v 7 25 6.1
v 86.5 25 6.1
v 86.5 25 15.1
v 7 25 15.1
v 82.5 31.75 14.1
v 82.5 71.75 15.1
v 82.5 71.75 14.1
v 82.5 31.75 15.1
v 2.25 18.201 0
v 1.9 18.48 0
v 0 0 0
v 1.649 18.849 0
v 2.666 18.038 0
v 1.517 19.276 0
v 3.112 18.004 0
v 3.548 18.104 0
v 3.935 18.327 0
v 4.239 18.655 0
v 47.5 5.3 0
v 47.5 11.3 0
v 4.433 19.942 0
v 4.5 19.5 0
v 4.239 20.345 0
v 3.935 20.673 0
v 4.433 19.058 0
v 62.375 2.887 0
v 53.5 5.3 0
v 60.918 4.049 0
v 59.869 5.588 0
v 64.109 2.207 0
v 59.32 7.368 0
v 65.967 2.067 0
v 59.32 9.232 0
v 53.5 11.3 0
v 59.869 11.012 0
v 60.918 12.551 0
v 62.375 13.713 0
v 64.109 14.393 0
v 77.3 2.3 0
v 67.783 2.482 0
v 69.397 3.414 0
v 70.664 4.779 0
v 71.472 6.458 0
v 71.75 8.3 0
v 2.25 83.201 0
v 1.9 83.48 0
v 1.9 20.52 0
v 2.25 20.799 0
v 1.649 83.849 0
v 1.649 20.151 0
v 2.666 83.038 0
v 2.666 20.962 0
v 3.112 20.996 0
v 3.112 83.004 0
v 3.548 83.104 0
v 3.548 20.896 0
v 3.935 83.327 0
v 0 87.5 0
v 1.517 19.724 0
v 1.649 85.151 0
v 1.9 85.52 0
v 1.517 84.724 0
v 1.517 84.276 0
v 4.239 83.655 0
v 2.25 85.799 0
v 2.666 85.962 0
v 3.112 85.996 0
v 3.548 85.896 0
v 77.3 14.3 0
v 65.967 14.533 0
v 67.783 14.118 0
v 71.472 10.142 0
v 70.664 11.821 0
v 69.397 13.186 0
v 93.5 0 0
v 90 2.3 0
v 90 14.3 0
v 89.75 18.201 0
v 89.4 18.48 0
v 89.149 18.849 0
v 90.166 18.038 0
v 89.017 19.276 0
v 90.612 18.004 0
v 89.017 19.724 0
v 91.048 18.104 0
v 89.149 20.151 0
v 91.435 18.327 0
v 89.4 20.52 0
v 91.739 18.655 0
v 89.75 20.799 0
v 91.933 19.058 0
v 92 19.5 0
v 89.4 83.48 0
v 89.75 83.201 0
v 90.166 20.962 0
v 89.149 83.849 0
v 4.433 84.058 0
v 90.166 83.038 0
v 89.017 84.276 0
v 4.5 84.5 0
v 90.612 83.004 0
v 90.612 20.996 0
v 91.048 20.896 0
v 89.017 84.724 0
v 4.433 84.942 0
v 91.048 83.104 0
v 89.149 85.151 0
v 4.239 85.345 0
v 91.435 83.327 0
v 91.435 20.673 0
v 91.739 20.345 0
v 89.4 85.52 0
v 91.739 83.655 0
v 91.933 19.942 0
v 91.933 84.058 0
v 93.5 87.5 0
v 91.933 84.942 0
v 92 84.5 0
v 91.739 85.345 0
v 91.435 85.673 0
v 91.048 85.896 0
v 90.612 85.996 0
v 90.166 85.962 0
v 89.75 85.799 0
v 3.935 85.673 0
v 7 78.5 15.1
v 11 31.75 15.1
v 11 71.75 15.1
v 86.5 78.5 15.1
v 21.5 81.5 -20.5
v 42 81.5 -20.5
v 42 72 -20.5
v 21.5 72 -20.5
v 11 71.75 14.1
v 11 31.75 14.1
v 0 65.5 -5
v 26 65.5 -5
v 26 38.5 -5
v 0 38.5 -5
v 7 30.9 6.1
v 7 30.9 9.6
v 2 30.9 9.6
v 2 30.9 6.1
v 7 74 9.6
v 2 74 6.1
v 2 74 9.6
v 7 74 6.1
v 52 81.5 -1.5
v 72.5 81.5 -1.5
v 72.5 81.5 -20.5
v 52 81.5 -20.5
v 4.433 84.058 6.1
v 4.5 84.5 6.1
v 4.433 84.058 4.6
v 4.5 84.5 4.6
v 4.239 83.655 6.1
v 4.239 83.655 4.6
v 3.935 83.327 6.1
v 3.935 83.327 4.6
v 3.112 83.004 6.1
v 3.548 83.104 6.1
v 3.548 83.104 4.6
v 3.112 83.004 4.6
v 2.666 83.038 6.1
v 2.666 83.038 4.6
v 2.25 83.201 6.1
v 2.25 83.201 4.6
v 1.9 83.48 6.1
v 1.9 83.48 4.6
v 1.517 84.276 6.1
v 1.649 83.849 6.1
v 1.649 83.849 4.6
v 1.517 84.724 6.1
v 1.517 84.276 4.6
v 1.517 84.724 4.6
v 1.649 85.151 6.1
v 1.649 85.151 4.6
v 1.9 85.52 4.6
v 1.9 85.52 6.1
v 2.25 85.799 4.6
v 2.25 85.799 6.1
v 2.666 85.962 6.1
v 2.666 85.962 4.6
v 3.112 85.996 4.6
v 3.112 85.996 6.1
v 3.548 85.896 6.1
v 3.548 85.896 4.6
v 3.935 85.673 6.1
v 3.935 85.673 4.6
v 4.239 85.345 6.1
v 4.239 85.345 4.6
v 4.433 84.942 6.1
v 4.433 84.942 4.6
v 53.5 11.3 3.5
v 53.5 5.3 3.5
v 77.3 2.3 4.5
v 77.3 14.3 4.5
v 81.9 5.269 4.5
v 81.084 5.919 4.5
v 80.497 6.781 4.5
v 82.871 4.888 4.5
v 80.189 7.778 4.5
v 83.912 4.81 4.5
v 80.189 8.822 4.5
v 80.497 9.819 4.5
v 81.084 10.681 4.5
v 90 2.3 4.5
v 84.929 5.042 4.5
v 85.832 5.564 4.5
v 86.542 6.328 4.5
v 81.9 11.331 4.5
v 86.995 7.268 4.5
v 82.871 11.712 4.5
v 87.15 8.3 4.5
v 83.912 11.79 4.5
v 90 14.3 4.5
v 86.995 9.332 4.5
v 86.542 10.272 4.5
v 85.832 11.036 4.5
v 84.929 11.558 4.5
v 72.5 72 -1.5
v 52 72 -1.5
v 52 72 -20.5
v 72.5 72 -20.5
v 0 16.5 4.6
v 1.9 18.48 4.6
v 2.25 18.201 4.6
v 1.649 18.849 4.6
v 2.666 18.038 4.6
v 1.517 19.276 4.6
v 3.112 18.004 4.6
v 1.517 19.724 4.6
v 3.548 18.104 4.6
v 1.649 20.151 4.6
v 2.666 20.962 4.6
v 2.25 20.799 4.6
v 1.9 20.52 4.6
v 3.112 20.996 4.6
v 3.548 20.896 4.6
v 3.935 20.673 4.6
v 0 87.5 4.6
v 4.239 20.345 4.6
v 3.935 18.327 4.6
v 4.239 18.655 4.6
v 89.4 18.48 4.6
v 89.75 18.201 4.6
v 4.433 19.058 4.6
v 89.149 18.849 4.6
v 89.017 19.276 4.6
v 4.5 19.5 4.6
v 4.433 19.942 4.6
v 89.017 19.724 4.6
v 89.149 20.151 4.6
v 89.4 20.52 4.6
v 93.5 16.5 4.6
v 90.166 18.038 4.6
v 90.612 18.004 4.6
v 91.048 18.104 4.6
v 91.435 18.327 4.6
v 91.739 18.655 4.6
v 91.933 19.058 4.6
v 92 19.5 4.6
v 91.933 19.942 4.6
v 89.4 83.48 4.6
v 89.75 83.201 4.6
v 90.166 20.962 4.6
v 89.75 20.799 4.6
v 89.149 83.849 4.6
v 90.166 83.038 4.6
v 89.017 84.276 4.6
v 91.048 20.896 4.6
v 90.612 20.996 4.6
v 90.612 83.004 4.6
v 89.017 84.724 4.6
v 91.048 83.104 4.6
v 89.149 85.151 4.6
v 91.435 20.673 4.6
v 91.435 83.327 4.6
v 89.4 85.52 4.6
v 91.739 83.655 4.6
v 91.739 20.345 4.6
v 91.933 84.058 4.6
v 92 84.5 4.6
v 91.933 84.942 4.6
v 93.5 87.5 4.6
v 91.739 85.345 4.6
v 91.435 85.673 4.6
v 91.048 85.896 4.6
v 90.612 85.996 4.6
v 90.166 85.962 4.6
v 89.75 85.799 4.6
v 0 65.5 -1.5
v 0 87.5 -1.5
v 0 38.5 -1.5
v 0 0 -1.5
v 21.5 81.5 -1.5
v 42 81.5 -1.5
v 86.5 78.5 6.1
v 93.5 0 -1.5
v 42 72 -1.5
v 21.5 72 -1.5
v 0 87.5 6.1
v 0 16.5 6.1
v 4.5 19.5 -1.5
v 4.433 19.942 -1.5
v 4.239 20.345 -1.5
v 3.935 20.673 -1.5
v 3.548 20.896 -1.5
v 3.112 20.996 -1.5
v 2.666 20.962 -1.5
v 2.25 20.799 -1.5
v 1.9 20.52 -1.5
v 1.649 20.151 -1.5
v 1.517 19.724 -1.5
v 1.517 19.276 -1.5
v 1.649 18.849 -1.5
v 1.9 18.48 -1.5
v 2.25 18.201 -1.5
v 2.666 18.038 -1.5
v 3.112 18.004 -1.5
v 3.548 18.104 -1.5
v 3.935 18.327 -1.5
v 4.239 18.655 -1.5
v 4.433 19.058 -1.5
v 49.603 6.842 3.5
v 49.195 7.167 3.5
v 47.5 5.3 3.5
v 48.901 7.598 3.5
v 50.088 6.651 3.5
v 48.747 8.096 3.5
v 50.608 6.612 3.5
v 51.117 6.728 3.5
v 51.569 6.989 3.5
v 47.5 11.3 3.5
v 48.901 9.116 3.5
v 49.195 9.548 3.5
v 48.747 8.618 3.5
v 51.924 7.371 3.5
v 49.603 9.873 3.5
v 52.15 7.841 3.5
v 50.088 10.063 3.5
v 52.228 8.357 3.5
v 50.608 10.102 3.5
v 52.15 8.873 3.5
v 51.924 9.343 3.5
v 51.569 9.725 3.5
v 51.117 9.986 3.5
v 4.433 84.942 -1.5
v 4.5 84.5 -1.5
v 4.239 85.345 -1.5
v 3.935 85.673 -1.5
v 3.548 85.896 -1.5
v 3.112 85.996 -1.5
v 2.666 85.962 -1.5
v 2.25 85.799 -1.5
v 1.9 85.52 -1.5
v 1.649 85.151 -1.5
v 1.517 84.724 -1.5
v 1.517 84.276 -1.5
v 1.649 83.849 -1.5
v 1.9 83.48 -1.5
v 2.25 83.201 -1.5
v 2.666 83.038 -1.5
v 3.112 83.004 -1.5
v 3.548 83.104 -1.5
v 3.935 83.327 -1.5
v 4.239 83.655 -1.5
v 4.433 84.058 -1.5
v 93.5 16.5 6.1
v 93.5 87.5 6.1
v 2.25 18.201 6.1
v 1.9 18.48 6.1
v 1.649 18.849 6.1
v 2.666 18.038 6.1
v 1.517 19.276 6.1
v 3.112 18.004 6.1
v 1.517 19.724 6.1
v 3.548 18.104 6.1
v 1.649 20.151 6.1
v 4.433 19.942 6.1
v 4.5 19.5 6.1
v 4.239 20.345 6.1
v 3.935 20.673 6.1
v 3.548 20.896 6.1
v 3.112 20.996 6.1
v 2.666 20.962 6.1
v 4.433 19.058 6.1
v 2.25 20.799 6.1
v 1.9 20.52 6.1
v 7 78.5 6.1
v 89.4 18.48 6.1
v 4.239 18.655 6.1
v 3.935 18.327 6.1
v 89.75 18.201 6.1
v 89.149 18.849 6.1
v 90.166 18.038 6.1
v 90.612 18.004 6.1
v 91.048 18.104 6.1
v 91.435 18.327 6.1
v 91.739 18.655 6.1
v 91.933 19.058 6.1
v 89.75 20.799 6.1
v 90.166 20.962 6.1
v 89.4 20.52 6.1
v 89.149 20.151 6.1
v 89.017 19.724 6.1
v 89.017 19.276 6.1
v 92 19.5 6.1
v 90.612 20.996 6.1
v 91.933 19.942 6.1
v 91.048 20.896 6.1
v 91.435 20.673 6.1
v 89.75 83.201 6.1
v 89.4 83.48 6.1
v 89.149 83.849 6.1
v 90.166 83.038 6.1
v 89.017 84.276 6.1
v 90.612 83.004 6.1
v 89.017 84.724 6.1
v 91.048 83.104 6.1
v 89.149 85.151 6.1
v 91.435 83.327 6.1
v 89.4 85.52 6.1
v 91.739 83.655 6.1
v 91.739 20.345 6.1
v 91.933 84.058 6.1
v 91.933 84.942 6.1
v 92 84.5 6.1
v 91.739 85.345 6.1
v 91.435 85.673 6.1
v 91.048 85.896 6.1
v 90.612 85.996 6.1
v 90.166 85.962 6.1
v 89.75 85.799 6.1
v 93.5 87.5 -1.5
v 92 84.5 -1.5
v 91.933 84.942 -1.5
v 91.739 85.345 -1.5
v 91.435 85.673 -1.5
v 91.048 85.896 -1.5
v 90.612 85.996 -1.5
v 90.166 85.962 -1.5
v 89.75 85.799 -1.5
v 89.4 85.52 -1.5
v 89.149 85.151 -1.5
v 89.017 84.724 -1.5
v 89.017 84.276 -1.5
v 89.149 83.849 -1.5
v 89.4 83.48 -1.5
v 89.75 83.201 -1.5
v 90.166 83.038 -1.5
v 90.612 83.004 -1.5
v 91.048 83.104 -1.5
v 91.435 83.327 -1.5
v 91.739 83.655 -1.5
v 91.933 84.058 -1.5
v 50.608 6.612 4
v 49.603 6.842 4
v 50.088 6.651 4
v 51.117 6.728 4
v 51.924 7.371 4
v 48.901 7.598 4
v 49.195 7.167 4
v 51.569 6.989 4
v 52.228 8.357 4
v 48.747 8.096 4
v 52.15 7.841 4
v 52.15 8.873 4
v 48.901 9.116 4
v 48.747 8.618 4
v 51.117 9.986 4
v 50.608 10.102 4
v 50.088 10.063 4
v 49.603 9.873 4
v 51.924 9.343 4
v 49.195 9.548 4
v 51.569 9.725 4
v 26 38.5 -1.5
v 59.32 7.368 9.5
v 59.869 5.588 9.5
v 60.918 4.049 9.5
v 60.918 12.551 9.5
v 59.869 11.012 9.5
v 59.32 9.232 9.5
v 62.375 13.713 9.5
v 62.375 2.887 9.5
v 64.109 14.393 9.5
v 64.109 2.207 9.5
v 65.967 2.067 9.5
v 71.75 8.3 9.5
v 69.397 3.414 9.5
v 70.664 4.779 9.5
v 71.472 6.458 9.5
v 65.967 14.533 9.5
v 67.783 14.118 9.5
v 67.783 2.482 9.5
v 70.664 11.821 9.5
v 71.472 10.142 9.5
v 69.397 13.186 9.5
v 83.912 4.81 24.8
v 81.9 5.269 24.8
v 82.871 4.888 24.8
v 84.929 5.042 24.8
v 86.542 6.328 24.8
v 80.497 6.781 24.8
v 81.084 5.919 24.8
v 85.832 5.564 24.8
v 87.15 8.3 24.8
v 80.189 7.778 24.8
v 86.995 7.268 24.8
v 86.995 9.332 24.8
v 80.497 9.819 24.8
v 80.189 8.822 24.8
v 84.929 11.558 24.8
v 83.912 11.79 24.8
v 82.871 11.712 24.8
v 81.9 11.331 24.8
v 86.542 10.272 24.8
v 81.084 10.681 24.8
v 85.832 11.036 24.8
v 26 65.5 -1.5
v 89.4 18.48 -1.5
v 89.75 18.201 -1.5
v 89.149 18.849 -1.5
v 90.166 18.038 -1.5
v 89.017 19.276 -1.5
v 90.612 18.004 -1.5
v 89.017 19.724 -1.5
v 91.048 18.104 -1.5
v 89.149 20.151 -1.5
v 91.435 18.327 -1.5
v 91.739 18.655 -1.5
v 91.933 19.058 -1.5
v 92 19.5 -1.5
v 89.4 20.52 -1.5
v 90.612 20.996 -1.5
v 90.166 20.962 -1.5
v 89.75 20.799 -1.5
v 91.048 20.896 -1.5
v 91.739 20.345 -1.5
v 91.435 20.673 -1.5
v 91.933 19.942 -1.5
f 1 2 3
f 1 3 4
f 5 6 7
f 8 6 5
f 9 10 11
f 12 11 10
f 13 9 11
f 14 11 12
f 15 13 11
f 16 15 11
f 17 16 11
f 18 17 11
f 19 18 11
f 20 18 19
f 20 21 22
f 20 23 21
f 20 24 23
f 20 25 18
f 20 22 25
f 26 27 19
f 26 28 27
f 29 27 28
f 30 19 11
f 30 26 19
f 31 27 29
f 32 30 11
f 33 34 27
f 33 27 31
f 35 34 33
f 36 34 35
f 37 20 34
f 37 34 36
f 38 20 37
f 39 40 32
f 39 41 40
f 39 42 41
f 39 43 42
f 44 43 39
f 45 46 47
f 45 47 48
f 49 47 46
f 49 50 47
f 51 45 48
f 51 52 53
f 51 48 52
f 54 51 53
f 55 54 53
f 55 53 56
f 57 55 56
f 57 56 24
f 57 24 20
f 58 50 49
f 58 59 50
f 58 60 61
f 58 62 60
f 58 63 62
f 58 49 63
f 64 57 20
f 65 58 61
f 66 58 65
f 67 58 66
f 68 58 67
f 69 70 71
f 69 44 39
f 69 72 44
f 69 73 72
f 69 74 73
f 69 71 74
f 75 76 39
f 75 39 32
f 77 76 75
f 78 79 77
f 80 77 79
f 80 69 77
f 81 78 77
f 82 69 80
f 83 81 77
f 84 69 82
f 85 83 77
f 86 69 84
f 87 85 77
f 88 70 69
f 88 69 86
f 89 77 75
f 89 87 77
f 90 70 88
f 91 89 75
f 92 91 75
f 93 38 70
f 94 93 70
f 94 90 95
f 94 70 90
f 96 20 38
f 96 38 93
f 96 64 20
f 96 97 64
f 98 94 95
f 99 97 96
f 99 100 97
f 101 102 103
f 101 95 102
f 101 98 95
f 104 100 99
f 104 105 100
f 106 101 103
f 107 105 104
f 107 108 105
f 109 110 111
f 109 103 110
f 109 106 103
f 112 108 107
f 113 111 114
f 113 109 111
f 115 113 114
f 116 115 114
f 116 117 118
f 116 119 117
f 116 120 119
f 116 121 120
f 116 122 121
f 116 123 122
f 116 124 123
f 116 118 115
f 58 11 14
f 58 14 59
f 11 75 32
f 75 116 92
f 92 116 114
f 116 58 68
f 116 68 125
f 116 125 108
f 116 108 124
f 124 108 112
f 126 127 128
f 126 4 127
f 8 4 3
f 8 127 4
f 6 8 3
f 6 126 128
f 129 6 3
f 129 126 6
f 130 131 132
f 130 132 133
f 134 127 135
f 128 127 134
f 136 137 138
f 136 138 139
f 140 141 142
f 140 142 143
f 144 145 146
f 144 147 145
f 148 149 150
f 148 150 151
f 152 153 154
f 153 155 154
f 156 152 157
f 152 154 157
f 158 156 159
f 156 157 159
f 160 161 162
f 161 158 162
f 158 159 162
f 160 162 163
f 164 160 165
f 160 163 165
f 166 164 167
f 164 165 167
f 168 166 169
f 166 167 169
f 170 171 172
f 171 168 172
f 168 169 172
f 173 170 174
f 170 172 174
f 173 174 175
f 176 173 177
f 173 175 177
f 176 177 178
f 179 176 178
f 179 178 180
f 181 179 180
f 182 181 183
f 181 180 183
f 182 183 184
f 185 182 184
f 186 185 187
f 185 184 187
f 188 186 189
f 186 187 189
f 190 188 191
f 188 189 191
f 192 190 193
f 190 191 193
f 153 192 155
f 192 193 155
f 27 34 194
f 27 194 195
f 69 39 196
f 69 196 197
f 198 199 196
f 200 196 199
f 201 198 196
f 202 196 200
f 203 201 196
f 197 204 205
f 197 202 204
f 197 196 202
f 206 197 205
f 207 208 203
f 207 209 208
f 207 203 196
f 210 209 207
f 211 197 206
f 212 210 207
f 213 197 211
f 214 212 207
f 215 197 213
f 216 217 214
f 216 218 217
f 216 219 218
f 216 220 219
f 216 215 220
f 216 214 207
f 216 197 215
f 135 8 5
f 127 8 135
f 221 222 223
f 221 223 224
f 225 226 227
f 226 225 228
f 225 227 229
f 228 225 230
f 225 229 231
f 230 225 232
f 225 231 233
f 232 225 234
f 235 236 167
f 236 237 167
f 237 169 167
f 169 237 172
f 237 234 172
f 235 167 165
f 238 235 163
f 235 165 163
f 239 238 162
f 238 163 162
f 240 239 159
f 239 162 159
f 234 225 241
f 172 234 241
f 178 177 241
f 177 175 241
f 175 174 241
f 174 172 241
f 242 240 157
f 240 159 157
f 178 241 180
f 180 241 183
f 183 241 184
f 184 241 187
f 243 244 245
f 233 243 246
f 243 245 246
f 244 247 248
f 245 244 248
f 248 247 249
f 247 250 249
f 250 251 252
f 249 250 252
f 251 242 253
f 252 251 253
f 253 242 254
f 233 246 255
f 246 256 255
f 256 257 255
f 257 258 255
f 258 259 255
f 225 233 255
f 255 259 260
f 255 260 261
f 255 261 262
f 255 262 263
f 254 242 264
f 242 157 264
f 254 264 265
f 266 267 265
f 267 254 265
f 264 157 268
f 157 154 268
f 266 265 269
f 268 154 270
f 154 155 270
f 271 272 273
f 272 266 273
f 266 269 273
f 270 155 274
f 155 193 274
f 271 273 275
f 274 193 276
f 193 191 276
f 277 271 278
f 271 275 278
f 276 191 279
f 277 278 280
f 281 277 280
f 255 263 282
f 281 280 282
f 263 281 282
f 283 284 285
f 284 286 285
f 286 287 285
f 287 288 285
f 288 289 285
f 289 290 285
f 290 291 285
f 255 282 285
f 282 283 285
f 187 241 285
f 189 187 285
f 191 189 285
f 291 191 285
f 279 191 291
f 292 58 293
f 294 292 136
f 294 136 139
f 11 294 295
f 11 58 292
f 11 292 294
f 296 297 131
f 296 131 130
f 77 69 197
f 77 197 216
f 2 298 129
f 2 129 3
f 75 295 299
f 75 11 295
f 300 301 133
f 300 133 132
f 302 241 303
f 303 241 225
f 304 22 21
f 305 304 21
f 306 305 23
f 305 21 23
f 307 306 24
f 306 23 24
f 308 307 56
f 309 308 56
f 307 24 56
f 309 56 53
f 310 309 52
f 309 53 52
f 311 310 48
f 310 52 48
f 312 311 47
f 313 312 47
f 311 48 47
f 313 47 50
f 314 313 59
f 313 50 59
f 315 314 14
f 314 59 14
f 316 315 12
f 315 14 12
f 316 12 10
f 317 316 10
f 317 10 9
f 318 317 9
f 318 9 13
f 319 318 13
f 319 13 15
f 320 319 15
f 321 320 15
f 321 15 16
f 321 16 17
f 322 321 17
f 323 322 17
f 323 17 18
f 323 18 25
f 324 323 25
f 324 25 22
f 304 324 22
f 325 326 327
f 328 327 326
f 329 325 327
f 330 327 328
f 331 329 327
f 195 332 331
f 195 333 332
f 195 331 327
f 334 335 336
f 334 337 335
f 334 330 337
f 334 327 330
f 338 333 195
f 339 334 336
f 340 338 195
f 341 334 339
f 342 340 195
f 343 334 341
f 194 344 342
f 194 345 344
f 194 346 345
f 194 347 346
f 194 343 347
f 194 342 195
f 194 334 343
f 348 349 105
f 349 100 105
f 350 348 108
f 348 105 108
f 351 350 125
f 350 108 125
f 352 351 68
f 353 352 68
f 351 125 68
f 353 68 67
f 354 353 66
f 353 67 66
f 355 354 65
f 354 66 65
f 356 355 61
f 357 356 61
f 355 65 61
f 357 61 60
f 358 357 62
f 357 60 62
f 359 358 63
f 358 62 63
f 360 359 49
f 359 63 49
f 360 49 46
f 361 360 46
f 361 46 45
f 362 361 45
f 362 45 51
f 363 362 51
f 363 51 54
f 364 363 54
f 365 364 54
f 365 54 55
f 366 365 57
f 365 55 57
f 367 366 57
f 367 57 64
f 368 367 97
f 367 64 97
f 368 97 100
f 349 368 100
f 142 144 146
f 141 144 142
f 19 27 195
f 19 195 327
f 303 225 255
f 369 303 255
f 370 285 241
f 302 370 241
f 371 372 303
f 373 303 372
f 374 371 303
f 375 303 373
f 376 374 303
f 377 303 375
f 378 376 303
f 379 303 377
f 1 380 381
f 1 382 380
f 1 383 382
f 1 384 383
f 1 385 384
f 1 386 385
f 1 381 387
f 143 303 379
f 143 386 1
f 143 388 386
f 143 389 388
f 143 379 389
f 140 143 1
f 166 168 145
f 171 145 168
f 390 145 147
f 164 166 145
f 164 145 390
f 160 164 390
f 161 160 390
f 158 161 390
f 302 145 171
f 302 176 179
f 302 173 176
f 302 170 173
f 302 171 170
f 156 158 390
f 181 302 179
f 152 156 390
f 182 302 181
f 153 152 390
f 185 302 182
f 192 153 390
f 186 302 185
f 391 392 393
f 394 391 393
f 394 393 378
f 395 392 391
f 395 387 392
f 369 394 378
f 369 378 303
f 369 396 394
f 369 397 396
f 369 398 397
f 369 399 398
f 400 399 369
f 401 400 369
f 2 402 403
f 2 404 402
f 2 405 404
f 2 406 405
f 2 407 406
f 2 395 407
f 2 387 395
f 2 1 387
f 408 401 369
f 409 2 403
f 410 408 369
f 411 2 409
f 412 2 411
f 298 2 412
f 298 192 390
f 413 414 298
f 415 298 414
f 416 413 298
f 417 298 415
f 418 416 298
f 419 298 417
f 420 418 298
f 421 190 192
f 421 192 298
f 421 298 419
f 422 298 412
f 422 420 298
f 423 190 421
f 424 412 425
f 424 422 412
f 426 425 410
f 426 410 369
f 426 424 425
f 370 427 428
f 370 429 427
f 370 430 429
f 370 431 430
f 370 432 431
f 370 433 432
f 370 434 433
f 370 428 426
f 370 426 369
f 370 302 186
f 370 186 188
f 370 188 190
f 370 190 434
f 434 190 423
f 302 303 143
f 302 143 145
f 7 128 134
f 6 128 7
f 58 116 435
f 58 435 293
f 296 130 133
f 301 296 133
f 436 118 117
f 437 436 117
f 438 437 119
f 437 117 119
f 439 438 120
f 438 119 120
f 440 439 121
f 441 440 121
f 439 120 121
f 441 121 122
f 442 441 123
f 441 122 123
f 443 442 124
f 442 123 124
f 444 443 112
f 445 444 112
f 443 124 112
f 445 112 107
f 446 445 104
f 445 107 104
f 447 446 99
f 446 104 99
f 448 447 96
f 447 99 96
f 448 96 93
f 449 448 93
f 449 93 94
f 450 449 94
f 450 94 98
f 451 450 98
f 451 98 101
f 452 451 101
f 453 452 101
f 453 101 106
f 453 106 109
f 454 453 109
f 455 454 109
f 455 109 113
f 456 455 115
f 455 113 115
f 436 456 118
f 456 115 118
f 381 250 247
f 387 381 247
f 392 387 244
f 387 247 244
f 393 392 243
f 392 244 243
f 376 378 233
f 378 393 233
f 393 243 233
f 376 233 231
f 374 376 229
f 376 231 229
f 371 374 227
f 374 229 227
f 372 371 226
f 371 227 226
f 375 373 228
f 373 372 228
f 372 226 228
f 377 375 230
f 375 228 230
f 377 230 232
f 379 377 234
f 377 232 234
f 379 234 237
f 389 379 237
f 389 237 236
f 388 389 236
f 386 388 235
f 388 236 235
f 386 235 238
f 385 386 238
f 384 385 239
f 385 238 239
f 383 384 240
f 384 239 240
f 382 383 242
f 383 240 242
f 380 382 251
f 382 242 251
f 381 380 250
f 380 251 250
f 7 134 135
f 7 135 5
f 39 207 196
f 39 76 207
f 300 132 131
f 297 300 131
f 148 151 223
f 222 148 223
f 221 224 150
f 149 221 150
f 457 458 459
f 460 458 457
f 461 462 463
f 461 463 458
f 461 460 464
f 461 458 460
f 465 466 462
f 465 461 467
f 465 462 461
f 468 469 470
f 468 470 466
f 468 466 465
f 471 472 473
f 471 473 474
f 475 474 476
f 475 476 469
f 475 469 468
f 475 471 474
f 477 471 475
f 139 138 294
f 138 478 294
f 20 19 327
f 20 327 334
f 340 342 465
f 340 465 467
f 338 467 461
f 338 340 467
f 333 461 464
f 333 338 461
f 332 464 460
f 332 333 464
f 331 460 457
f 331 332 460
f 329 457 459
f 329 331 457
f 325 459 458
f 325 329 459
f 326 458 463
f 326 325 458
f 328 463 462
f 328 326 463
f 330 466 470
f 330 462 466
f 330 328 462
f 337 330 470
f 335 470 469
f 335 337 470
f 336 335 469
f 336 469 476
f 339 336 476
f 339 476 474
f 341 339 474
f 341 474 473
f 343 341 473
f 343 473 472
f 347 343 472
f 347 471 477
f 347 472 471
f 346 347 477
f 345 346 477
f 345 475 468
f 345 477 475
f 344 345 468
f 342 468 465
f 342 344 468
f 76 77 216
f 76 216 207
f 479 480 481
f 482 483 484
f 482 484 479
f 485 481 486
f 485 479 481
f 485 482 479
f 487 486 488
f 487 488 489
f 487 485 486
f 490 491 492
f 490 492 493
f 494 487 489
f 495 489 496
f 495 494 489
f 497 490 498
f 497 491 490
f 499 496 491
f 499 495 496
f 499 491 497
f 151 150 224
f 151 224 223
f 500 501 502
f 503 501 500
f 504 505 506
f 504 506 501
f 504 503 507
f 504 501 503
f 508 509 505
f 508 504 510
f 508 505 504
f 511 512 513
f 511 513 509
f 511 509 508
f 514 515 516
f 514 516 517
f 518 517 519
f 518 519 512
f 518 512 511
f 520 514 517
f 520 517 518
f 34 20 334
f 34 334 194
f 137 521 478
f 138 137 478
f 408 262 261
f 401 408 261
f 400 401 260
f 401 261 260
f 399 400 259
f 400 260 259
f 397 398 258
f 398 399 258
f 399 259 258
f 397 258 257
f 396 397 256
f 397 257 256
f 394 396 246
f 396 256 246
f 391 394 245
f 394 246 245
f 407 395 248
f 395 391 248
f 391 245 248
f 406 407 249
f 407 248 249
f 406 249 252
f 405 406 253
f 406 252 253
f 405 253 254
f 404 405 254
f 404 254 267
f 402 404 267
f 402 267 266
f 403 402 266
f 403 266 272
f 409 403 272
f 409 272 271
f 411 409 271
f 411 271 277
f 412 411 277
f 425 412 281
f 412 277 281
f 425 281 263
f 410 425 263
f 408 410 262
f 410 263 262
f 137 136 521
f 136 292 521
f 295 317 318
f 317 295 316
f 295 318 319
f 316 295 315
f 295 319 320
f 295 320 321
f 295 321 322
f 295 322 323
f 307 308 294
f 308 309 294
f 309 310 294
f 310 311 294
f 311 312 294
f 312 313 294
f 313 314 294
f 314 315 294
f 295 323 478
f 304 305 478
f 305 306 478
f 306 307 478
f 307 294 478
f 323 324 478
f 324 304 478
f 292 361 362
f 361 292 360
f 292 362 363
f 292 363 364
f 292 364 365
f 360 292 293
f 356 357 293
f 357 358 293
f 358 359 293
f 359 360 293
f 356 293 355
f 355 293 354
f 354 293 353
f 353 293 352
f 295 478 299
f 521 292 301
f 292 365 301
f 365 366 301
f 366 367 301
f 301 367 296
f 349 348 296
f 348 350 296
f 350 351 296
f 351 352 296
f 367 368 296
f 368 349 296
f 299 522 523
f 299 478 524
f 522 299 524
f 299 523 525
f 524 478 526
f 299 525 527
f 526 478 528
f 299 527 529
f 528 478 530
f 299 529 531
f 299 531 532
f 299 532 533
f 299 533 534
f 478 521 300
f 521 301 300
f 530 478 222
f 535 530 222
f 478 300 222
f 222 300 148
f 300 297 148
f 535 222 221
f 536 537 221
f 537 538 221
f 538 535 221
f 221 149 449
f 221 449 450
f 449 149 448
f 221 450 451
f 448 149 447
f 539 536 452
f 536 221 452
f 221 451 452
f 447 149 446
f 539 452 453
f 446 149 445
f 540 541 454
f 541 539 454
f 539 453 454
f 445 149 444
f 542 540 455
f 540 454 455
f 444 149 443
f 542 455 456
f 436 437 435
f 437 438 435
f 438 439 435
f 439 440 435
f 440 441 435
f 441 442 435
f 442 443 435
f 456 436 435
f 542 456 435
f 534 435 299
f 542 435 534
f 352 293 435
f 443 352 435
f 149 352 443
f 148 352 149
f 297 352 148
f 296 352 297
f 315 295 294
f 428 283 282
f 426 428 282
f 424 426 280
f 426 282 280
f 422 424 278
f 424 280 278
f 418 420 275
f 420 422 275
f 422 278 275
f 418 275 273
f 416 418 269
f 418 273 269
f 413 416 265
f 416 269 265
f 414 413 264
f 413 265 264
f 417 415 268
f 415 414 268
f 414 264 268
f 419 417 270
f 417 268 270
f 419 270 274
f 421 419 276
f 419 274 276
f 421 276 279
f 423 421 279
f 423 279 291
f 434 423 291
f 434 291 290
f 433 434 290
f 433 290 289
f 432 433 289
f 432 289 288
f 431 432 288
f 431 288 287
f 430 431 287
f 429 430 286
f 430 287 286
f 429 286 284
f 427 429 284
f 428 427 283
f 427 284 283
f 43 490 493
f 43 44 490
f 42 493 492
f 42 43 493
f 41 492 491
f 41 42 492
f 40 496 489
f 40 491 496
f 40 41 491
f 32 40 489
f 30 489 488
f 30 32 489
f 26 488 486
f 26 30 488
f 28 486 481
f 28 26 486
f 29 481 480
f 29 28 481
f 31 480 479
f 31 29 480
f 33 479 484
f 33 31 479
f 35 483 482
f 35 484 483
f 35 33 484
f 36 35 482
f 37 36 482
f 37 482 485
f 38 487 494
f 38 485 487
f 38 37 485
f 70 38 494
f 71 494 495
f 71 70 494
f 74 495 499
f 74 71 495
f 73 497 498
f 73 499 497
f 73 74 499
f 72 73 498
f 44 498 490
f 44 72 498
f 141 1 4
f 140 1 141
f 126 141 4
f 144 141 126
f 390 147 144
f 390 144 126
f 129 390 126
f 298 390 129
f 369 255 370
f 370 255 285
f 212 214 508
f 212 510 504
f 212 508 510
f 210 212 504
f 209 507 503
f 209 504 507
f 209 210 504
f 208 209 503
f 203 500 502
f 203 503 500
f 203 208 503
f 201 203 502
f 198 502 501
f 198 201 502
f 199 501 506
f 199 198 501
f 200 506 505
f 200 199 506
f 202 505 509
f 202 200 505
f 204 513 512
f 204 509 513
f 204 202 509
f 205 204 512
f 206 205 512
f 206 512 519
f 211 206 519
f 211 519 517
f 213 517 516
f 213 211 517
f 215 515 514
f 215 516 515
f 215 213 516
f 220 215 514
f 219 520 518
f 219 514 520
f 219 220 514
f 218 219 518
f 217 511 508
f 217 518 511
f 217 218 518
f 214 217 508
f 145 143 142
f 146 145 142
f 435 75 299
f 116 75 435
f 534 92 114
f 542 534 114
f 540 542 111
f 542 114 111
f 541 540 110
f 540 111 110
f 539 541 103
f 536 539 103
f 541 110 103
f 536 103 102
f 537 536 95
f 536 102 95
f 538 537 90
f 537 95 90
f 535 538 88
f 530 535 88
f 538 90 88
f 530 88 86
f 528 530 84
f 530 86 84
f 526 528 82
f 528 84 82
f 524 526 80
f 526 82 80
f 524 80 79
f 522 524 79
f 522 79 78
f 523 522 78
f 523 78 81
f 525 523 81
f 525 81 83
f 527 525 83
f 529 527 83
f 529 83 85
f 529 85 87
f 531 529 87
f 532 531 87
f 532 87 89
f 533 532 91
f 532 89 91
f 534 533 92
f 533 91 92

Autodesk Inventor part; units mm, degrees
ref_plane "YZ Plane" through (0, 0, 0) normal (1, 0, 0) x (0, 1, 0)
ref_plane "XZ Plane" through (0, 0, 0) normal (0, 1, 0) x (-1, 0, 0)
sketch "Sketch1" plane through (0, 0, 0) normal (0, 0, 1) x (1, 0, 0)
  line L0 (0, 0) -> (93.5, 0)
  line L1 (93.5, 0) -> (93.5, 87.5)
  line L2 (93.5, 87.5) -> (0, 87.5)
  line L3 (0, 87.5) -> (0, 0)
  line L4 (3, 84.5) -> (90.5, 84.5) construction
  line L5 (90.5, 84.5) -> (90.5, 19.5) construction
  line L6 (90.5, 19.5) -> (3, 19.5) construction
  line L7 (3, 19.5) -> (3, 84.5) construction
  circle A0 centre (3, 84.5) radius 1.5
  circle A1 centre (90.5, 84.5) radius 1.5
  circle A2 centre (90.5, 19.5) radius 1.5
  circle A3 centre (3, 19.5) radius 1.5
  dimension "d0" = 93.5
  dimension "d1" = 87.5
  dimension "d2" = 87.5
  dimension "d3" = 65
  dimension "d4" = 3
  dimension "d5" = 3
  dimension "d6" = 3
extrude "Extrusion1" add sketch "Sketch1" against normal blind 1.5
sketch "Sketch2" plane through (0, 0, -1.5) normal (0, 0, -1) x (-1, 0, 0)
  line L0 (0, 0) -> (0, 87.5) projected
  line L1 (0, 87.5) -> (-93.5, 87.5) projected
  line L2 (0, 65.5) -> (-26, 65.5)
  line L3 (-26, 65.5) -> (-26, 38.5)
  line L4 (-26, 38.5) -> (0, 38.5)
  line L5 (0, 38.5) -> (0, 65.5)
  dimension "d9" = 22
  dimension "d10" = 26
  dimension "d11" = 27
extrude "Extrusion2" add sketch "Sketch2" along normal blind 3.5
sketch "Sketch3" plane through (0, 0, -1.5) normal (0, 0, -1) x (-1, 0, 0)
  line L0 (0, 65.5) -> (0, 87.5) projected
  line L1 (0, 87.5) -> (-93.5, 87.5) projected
  line L2 (-42, 81.5) -> (-21.5, 81.5)
  line L3 (-21.5, 81.5) -> (-21.5, 72)
  line L4 (-21.5, 72) -> (-42, 72)
  line L5 (-42, 72) -> (-42, 81.5)
  line L6 (-72.5, 81.5) -> (-52, 81.5)
  line L7 (-52, 81.5) -> (-52, 72)
  line L8 (-52, 72) -> (-72.5, 72)
  line L9 (-72.5, 72) -> (-72.5, 81.5)
  dimension "d14" = 21.5
  dimension "d15" = 6
  dimension "d16" = 9.5
  dimension "d17" = 20.5
  dimension "d18" = 10
  dimension "d19" = 6
extrude "Extrusion3" add sketch "Sketch3" along normal blind 19
ref_plane "Work Plane1" through (0, 0, 4.6) normal (0, 0, 1) x (1, 0, 0)
sketch "Sketch4" plane through (0, 0, 4.6) normal (0, 0, 1) x (1, 0, 0)
  line L0 (0, 0) -> (0, 16.5) construction
  line L1 (0, 16.5) -> (93.5, 16.5)
  line L2 (93.5, 16.5) -> (93.5, 87.5)
  line L3 (93.5, 87.5) -> (0, 87.5)
  line L4 (0, 87.5) -> (0, 16.5)
  line L5 (3, 84.5) -> (90.5, 84.5) construction
  line L6 (90.5, 84.5) -> (90.5, 19.5) construction
  line L7 (90.5, 19.5) -> (3, 19.5) construction
  line L8 (3, 19.5) -> (3, 84.5) construction
  circle A0 centre (3, 84.5) radius 1.5
  circle A1 centre (90.5, 84.5) radius 1.5
  circle A2 centre (90.5, 19.5) radius 1.5
  circle A3 centre (3, 19.5) radius 1.5
  dimension "d23" = 16.5
  dimension "d24" = 93.5
  dimension "d25" = 71
  dimension "d26" = 87.5
  dimension "d27" = 65
  dimension "d28" = 3
  dimension "d29" = 3
  dimension "d30" = 3
extrude "Extrusion4" add sketch "Sketch4" along normal blind 1.5
sketch "Sketch5" plane through (0, 0, 6.1) normal (0, 0, 1) x (1, 0, 0)
  line L0 (0, 16.5) -> (93.5, 16.5) projected
  line L1 (93.5, 16.5) -> (93.5, 87.5) projected
  line L2 (93.5, 87.5) -> (0, 87.5) projected
  line L3 (0, 87.5) -> (0, 16.5) projected
  line L4 (7, 78.5) -> (86.5, 78.5)
  line L5 (86.5, 78.5) -> (86.5, 25)
  line L6 (86.5, 25) -> (7, 25)
  line L7 (7, 25) -> (7, 78.5)
  point P0 (0, 0)
  dimension "d33" = 9
  dimension "d34" = 7
  dimension "d35" = 7
  dimension "d36" = 8.5
  dimension "d37" = 53.5
extrude "Extrusion5" add sketch "Sketch5" along normal blind 9 contours L4 L5 L6 L7
sketch "Sketch6" plane through (7, 25, 6.1) normal (-1, 0, 0) x (0, 0, 1)
  line L0 (0, 0) -> (0, 53.5) projected
  line L1 (0, 53.5) -> (9, 53.5) projected
  line L2 (0, 49) -> (3.5, 49)
  line L3 (3.5, 49) -> (3.5, 5.9)
  line L4 (3.5, 5.9) -> (0, 5.9)
  line L5 (0, 5.9) -> (0, 49)
  point P0 (-6.1, -25)
  dimension "d40" = 3.5
  dimension "d41" = 43.1
  dimension "d42" = 4.5
extrude "Extrusion6" add sketch "Sketch6" along normal blind 5
sketch "Sketch7" plane through (0, 0, 0) normal (0, 0, 1) x (1, 0, 0)
  line L0 (47.5, 11.3) -> (53.5, 11.3)
  line L1 (53.5, 11.3) -> (53.5, 5.3)
  line L2 (53.5, 5.3) -> (47.5, 5.3)
  line L3 (47.5, 5.3) -> (47.5, 11.3)
  line L4 (0, 0) -> (93.5, 0) projected
  line L5 (93.5, 0) -> (93.5, 87.5) projected
  dimension "d45" = 6
  dimension "d46" = 6
  dimension "d52" = 40
  dimension "d53" = 5.3
extrude "Extrusion7" add sketch "Sketch7" along normal blind 3.5
sketch "Sketch8" plane through (0, 0, 3.5) normal (0, 0, 1) x (1, 0, 0)
  circle A0 centre (50.4777, 8.3572) radius 1.75
  point P0 (0, 0)
  dimension "d49" = 3.5
extrude "Extrusion8" add sketch "Sketch8" along normal blind 0.5
sketch "Sketch9" plane through (0, 0, 0) normal (0, 0, 1) x (1, 0, 0)
  line L0 (0, 0) -> (93.5, 0) projected
  line L1 (93.5, 0) -> (93.5, 87.5) projected
  circle A0 centre (65.5, 8.3) radius 6.25
  dimension "d54" = 12.5
  dimension "d55" = 28
  dimension "d56" = 8.3
extrude "Extrusion9" add sketch "Sketch9" along normal blind 9.5
sketch "Sketch10" plane through (0, 0, 0) normal (0, 0, 1) x (1, 0, 0)
  line L0 (0, 0) -> (93.5, 0) projected
  line L1 (93.5, 0) -> (93.5, 87.5) projected
  line L2 (77.3, 14.3) -> (90, 14.3)
  line L3 (90, 14.3) -> (90, 2.3)
  line L4 (90, 2.3) -> (77.3, 2.3)
  line L5 (77.3, 2.3) -> (77.3, 14.3)
  line L6 (77.3, 14.3) -> (90, 2.3) construction
  line L7 (90, 14.3) -> (77.3, 2.3) construction
  point P0 (83.65, 8.3)
  dimension "d59" = 12.7
  dimension "d60" = 12
  dimension "d61" = 3.5
  dimension "d62" = 2.3
extrude "Extrusion10" add sketch "Sketch10" along normal blind 4.5
sketch "Sketch11" plane through (0, 0, 4.5) normal (0, 0, 1) x (1, 0, 0)
  circle A0 centre (83.65, 8.3) radius 3.5
  point P0 (0, 0)
  dimension "d65" = 7
extrude "Extrusion11" add sketch "Sketch11" along normal blind 20.3
sketch "Sketch12" plane through (0, 0, 15.1) normal (0, 0, 1) x (1, 0, 0)
  line L0 (86.5, 78.5) -> (7, 78.5) projected
  line L1 (7, 78.5) -> (7, 25) projected
  line L2 (7, 25) -> (86.5, 25) projected
  line L3 (86.5, 25) -> (86.5, 78.5) projected
  line L4 (11, 71.75) -> (82.5, 71.75)
  line L5 (82.5, 71.75) -> (82.5, 31.75)
  line L6 (82.5, 31.75) -> (11, 31.75)
  line L7 (11, 31.75) -> (11, 71.75)
  point P0 (0, 0)
  dimension "d68" = 71.5
  dimension "d69" = 40
  dimension "d70" = 6.75
  dimension "d71" = 6.75
  dimension "d72" = 4
  dimension "d73" = 4
extrude "Extrusion12" cut sketch "Sketch12" against normal blind 1 contours L4 L5 L6 L7
properties part number "RRD Smart Graphic Controller"
